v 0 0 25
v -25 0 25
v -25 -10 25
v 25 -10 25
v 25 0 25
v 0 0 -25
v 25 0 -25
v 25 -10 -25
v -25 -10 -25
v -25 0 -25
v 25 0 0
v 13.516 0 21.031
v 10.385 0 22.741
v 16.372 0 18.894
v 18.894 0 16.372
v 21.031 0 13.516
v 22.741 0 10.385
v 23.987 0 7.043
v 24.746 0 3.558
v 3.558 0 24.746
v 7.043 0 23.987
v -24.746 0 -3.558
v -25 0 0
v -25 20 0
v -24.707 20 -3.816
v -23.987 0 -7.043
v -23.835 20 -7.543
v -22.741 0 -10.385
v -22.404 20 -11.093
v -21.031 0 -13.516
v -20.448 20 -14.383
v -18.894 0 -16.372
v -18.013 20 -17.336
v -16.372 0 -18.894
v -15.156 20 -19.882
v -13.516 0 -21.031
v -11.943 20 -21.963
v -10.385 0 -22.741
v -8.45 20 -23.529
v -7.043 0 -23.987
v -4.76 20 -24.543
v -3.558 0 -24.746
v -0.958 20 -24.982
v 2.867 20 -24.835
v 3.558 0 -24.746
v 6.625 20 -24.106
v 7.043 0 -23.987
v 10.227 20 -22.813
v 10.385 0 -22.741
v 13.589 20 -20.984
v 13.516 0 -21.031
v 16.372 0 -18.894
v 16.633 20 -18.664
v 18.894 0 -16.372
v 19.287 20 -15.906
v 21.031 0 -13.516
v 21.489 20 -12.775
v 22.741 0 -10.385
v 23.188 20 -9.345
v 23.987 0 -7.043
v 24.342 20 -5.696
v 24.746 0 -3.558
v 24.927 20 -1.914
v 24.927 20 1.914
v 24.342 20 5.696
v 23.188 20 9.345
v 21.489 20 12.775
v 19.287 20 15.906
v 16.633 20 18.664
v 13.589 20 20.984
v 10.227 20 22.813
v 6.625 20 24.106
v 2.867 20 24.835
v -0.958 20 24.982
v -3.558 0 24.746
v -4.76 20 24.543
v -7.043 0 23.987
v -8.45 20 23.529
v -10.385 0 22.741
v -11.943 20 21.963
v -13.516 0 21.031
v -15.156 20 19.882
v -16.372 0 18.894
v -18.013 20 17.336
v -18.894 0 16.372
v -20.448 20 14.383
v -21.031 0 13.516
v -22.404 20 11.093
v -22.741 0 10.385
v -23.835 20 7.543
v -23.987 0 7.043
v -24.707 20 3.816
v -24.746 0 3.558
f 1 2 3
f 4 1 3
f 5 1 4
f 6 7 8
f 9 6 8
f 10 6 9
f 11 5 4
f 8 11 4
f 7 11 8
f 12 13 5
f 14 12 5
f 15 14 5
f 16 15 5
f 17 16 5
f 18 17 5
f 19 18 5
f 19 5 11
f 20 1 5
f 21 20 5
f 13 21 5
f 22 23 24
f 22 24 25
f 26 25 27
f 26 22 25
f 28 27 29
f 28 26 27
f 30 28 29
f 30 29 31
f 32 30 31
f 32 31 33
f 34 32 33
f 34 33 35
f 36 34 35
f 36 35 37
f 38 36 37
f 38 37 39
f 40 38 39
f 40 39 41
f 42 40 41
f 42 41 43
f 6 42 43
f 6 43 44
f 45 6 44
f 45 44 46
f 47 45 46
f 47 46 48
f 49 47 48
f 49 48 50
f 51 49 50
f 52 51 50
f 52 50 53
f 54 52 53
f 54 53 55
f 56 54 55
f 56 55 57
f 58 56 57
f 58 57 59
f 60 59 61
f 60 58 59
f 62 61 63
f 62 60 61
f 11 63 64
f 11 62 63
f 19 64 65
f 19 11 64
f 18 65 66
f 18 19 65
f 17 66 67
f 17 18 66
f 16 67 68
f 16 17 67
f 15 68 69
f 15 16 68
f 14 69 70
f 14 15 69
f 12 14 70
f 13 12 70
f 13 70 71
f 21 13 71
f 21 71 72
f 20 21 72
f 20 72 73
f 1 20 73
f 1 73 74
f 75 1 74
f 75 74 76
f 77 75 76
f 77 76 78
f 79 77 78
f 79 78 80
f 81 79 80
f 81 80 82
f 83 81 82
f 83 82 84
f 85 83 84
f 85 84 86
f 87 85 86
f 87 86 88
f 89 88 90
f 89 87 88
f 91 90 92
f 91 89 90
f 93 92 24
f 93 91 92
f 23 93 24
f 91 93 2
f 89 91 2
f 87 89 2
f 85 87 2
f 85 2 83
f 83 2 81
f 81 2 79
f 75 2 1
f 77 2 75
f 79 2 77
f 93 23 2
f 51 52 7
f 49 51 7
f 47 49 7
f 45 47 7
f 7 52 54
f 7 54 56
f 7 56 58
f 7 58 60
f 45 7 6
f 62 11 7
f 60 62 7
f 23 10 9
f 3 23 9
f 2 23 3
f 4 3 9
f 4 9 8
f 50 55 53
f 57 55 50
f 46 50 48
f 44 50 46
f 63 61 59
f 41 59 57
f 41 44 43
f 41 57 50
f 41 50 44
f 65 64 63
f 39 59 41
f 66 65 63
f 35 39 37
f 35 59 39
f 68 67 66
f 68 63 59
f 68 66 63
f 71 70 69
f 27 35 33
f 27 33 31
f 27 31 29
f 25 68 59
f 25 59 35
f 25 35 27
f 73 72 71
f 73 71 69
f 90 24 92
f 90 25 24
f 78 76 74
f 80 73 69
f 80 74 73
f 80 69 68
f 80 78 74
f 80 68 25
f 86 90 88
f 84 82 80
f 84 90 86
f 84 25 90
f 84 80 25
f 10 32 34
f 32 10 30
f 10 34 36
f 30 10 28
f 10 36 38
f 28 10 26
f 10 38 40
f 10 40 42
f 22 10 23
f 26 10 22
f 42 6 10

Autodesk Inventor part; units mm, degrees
ref_plane "YZ Plane" through (0, 0, 0) normal (1, 0, 0) x (0, 1, 0)
ref_plane "XZ Plane" through (0, 0, 0) normal (0, 1, 0) x (-1, 0, 0)
ref_plane "XY Plane" through (0, 0, 0) normal (0, 0, 1) x (1, 0, 0)
sketch "Skizze1" plane through (0, 0, 0) normal (0, 1, 0) x (-1, 0, 0)
  circle A0 centre (0, 0) radius 25
  dimension "d0" = 50
extrude "Extrusion1" add sketch "Skizze1" along normal blind 20
sketch "Skizze2" plane through (0, 0, 0) normal (0, -1, 0) x (1, 0, 0)
  line L0 (-25, 25) -> (25, 25)
  line L1 (25, 25) -> (25, -25)
  line L2 (25, -25) -> (-25, -25)
  line L3 (-25, -25) -> (-25, 25)
  circle A0 centre (0, 0) radius 25 projected
extrude "Extrusion2" add sketch "Skizze2" along normal blind 10
equation "\"d0\" = UsedParameter"
equation "\"UsedParameter\" = 50"
equation "\"unusedParameter\" = 1"
properties part number "2Extrusionen"
